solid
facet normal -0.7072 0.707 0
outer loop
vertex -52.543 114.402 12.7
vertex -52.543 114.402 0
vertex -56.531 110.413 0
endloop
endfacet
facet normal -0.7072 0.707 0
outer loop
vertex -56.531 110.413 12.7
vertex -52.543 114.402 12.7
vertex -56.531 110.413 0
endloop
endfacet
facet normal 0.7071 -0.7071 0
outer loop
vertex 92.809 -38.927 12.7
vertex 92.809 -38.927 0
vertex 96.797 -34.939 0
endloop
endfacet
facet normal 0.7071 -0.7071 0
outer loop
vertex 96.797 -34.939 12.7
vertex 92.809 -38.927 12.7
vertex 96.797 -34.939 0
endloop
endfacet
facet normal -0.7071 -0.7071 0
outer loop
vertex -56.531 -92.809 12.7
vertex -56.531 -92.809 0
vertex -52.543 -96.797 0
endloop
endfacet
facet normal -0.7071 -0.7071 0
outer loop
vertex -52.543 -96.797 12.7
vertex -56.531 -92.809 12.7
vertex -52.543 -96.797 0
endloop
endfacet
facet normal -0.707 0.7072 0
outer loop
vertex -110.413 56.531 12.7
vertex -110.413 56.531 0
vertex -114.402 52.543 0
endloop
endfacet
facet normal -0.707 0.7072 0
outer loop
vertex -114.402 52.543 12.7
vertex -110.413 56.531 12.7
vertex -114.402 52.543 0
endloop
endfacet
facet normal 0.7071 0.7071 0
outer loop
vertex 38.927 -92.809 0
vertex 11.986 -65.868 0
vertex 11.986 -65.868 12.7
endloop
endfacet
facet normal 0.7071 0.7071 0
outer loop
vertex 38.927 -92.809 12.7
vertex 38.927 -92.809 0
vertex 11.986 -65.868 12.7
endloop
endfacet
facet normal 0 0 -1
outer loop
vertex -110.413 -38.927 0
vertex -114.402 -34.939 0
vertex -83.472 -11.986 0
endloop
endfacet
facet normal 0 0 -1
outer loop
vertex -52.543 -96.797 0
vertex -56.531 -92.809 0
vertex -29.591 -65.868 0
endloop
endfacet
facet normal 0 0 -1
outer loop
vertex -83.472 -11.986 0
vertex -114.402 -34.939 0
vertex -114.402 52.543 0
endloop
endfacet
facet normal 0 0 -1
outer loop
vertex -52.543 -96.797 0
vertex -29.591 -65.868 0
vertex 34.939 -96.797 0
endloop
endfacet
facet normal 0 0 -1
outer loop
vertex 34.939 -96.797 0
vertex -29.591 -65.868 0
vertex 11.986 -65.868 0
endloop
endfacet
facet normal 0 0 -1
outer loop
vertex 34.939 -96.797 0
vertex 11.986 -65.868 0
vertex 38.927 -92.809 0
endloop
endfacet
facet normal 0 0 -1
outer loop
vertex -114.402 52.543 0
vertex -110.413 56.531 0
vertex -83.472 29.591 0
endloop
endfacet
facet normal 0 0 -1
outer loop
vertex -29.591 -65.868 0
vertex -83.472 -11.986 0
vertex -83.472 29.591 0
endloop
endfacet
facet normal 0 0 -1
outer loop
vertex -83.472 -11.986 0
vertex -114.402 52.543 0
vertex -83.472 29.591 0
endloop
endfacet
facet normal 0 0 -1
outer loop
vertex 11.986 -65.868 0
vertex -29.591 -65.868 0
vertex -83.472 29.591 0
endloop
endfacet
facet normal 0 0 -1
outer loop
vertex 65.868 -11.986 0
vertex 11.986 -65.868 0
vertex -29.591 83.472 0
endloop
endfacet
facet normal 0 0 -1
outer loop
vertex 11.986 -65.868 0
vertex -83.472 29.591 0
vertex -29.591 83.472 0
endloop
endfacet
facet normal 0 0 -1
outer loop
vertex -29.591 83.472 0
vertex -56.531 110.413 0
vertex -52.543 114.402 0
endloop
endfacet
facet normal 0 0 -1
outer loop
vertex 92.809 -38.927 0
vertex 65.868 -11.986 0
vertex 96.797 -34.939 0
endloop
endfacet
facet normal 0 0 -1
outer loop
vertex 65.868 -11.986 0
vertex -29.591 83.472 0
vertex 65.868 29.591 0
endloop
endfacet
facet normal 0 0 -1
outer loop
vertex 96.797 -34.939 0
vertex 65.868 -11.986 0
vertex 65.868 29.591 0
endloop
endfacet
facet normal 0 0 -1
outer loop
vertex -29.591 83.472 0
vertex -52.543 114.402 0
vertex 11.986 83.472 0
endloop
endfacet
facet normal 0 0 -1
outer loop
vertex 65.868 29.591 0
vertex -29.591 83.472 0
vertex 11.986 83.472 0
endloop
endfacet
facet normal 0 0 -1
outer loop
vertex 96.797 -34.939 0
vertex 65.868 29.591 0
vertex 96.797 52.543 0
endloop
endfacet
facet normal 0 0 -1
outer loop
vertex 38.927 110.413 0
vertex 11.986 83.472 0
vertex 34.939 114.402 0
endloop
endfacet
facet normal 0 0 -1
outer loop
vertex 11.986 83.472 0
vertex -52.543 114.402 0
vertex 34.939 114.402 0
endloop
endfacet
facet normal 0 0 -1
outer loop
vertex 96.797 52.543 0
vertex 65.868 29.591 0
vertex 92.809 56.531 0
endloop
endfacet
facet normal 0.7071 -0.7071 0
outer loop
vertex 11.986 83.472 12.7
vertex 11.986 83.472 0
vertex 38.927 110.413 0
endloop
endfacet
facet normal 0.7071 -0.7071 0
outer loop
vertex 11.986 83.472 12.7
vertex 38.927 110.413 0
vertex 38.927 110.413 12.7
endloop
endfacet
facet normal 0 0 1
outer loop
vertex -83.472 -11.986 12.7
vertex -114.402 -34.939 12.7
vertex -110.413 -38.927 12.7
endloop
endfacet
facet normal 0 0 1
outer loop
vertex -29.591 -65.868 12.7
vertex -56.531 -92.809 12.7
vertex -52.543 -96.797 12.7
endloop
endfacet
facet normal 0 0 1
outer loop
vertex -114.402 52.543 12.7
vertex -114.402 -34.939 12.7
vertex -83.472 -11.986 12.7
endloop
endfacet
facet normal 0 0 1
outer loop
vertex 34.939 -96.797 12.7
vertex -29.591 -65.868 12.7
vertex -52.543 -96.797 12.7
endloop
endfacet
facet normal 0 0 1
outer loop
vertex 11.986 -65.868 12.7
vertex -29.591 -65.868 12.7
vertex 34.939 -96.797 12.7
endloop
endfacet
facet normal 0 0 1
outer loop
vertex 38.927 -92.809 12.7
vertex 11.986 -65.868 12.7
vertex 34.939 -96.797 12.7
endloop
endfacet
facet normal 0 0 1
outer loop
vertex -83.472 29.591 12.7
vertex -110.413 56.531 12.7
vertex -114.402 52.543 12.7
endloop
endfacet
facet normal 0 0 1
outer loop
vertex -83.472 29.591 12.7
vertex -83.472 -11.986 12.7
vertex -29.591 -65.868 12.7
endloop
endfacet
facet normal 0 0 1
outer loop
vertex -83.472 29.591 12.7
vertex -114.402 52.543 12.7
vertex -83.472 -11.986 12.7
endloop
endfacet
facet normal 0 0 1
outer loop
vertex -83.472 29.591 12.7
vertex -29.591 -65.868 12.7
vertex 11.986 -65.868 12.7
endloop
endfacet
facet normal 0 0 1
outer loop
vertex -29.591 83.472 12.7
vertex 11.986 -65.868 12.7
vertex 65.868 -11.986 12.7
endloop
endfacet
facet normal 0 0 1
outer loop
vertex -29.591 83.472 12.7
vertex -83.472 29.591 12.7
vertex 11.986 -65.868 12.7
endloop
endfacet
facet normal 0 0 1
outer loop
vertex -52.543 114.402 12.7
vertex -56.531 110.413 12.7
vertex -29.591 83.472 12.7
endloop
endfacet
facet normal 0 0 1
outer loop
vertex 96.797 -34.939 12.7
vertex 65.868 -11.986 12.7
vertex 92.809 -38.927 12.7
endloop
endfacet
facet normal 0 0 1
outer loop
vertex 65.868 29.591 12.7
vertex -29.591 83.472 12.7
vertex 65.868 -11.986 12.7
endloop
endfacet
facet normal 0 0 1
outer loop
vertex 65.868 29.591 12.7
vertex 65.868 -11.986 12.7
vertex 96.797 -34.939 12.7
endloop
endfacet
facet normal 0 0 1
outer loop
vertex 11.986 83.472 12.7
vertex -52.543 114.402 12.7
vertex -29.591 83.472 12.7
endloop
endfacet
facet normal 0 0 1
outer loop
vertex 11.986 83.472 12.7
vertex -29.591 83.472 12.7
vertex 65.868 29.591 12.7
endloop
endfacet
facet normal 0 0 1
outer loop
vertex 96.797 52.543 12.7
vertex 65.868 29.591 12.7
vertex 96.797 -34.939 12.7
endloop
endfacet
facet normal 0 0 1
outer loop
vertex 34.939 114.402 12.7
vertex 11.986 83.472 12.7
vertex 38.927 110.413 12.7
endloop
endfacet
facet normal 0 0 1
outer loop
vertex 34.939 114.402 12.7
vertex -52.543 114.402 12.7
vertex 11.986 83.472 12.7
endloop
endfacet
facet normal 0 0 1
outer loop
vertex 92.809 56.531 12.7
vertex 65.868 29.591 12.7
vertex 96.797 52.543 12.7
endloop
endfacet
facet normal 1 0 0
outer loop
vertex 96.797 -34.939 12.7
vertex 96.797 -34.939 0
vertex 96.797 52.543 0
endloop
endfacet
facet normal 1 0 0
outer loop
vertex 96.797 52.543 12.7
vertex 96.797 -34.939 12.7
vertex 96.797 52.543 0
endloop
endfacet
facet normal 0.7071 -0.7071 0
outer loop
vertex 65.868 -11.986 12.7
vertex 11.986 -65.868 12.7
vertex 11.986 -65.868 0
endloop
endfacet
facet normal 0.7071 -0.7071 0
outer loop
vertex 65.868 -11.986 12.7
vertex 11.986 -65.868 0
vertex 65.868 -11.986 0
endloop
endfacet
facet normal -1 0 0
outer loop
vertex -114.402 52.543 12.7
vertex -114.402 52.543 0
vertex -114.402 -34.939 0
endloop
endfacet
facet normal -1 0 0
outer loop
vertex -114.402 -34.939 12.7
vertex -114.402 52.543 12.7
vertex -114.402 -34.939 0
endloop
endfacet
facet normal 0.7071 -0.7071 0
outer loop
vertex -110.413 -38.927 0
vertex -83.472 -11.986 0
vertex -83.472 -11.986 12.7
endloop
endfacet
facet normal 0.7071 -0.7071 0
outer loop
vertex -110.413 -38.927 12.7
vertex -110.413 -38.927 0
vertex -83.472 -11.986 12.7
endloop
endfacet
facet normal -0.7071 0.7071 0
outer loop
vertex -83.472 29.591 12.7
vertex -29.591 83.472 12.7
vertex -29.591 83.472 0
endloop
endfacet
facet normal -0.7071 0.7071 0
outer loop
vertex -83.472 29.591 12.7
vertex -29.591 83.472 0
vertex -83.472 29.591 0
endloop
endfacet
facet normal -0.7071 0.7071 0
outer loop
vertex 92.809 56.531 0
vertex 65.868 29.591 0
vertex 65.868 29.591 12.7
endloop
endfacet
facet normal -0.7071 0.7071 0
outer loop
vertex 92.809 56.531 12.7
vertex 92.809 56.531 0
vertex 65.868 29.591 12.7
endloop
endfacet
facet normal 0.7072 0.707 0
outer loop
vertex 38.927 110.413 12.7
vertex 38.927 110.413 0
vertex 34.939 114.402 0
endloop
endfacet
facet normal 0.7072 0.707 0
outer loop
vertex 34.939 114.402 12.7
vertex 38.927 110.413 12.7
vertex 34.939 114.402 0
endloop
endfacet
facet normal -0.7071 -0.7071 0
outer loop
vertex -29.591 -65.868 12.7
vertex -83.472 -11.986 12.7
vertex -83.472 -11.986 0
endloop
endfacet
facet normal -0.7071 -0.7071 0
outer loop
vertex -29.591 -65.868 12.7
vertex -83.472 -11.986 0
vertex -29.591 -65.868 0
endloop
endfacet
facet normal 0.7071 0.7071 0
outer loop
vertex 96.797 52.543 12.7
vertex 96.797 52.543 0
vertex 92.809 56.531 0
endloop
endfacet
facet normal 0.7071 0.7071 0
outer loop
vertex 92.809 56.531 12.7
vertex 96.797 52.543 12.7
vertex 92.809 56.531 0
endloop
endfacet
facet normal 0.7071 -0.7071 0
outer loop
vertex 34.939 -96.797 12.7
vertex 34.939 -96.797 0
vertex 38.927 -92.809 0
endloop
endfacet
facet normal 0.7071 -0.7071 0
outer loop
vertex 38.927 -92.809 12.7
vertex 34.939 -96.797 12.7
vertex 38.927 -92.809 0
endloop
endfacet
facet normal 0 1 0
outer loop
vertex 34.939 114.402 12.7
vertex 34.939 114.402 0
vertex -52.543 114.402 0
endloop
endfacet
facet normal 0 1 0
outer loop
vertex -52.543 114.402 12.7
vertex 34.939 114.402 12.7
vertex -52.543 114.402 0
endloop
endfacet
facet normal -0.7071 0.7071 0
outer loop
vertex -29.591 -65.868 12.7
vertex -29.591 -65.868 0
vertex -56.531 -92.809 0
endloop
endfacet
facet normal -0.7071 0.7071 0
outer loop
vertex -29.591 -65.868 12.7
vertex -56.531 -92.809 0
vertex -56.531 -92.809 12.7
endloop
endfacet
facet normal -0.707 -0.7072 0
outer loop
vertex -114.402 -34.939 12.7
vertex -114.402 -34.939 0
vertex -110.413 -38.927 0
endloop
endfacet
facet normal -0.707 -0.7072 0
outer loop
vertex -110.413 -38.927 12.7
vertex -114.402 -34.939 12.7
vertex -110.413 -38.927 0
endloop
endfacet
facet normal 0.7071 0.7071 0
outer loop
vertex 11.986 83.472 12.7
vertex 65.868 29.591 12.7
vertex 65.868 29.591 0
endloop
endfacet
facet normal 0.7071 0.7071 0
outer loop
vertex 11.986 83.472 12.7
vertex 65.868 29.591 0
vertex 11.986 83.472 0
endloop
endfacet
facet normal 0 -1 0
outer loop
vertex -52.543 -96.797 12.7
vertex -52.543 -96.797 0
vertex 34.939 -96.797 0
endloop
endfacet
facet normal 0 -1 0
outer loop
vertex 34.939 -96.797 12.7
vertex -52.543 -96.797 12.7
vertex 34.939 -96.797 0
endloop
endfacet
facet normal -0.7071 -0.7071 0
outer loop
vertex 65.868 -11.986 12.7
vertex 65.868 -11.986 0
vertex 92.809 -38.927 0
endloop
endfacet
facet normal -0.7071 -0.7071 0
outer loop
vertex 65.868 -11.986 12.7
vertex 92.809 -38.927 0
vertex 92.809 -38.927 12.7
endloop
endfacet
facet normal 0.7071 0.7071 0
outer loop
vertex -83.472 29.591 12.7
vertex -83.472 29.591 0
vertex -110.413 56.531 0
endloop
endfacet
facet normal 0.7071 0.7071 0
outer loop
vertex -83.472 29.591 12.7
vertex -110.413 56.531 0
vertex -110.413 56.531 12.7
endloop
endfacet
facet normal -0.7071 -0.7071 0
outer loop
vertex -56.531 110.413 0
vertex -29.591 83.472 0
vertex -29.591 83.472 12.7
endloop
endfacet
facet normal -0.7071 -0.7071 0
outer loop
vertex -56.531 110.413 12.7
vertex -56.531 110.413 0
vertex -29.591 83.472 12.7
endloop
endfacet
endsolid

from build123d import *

# Parameters (mm, degrees)
F1_DEPTH = 12.7
F2_W     = 76.2
F2_H     = 12.7
F3_DEPTH = 38.1
F4_W     = 76.2
F4_H     = 12.7
F5_DEPTH = 38.1
F6_W     = 76.2
F6_H     = 12.7
F7_DEPTH = 38.1
F8_W     = 76.2
F8_H     = 12.7
F9_DEPTH = 38.1


with BuildPart() as f1:
    # F0 (on Top) → F1 (new body)
    with BuildSketch(Plane.XY):
        Polygon((34.9385468854, 114.4016), (-52.5428857533, 114.4016), (-114.4016, 52.5428857533), (-114.4016, -34.9385468854), (-52.5428857533, -96.7972611321), (34.9385468854, -96.7972611321), (96.7972611321, -34.9385468854), (96.7972611321, 52.5428857533), align=None)
    extrude(amount=F1_DEPTH)

    # F2 (on face) → F3 (cut)
    with BuildSketch(Plane(origin=(65.8679040087, -65.8679040087, 0), x_dir=(0.7071067812, 0.7071067812, 0), z_dir=(0.7071067812, -0.7071067812, 0))):
        with Locations((0, 6.35)):
            Rectangle(F2_W, F2_H)
    extrude(amount=-F3_DEPTH, mode=Mode.SUBTRACT)

    # F4 (on face) → F5 (cut)
    with BuildSketch(Plane(origin=(-74.6700734427, -74.6700734427, 0), x_dir=(0.7071067812, -0.7071067812, 0), z_dir=(-0.7071067812, -0.7071067812, 0))):
        with Locations((-12.4481473918, 6.35)):
            Rectangle(F4_W, F4_H)
    extrude(amount=-F5_DEPTH, mode=Mode.SUBTRACT)

    # F6 (on face) → F7 (cut)
    with BuildSketch(Plane(origin=(-83.4722428766, 83.4722428766, 0), x_dir=(-0.7071067812, -0.7071067812, 0), z_dir=(-0.7071067812, 0.7071067812, 0))):
        with Locations((0, 6.35)):
            Rectangle(F6_W, F6_H)
    extrude(amount=-F7_DEPTH, mode=Mode.SUBTRACT)

    # F8 (on face) → F9 (cut)
    with BuildSketch(Plane(origin=(74.6700734427, 74.6700734427, 0), x_dir=(-0.7071067812, 0.7071067812, 0), z_dir=(0.7071067812, 0.7071067812, 0))):
        with Locations((12.4481473918, 6.35)):
            Rectangle(F8_W, F8_H)
    extrude(amount=-F9_DEPTH, mode=Mode.SUBTRACT)


solid = f1.part
